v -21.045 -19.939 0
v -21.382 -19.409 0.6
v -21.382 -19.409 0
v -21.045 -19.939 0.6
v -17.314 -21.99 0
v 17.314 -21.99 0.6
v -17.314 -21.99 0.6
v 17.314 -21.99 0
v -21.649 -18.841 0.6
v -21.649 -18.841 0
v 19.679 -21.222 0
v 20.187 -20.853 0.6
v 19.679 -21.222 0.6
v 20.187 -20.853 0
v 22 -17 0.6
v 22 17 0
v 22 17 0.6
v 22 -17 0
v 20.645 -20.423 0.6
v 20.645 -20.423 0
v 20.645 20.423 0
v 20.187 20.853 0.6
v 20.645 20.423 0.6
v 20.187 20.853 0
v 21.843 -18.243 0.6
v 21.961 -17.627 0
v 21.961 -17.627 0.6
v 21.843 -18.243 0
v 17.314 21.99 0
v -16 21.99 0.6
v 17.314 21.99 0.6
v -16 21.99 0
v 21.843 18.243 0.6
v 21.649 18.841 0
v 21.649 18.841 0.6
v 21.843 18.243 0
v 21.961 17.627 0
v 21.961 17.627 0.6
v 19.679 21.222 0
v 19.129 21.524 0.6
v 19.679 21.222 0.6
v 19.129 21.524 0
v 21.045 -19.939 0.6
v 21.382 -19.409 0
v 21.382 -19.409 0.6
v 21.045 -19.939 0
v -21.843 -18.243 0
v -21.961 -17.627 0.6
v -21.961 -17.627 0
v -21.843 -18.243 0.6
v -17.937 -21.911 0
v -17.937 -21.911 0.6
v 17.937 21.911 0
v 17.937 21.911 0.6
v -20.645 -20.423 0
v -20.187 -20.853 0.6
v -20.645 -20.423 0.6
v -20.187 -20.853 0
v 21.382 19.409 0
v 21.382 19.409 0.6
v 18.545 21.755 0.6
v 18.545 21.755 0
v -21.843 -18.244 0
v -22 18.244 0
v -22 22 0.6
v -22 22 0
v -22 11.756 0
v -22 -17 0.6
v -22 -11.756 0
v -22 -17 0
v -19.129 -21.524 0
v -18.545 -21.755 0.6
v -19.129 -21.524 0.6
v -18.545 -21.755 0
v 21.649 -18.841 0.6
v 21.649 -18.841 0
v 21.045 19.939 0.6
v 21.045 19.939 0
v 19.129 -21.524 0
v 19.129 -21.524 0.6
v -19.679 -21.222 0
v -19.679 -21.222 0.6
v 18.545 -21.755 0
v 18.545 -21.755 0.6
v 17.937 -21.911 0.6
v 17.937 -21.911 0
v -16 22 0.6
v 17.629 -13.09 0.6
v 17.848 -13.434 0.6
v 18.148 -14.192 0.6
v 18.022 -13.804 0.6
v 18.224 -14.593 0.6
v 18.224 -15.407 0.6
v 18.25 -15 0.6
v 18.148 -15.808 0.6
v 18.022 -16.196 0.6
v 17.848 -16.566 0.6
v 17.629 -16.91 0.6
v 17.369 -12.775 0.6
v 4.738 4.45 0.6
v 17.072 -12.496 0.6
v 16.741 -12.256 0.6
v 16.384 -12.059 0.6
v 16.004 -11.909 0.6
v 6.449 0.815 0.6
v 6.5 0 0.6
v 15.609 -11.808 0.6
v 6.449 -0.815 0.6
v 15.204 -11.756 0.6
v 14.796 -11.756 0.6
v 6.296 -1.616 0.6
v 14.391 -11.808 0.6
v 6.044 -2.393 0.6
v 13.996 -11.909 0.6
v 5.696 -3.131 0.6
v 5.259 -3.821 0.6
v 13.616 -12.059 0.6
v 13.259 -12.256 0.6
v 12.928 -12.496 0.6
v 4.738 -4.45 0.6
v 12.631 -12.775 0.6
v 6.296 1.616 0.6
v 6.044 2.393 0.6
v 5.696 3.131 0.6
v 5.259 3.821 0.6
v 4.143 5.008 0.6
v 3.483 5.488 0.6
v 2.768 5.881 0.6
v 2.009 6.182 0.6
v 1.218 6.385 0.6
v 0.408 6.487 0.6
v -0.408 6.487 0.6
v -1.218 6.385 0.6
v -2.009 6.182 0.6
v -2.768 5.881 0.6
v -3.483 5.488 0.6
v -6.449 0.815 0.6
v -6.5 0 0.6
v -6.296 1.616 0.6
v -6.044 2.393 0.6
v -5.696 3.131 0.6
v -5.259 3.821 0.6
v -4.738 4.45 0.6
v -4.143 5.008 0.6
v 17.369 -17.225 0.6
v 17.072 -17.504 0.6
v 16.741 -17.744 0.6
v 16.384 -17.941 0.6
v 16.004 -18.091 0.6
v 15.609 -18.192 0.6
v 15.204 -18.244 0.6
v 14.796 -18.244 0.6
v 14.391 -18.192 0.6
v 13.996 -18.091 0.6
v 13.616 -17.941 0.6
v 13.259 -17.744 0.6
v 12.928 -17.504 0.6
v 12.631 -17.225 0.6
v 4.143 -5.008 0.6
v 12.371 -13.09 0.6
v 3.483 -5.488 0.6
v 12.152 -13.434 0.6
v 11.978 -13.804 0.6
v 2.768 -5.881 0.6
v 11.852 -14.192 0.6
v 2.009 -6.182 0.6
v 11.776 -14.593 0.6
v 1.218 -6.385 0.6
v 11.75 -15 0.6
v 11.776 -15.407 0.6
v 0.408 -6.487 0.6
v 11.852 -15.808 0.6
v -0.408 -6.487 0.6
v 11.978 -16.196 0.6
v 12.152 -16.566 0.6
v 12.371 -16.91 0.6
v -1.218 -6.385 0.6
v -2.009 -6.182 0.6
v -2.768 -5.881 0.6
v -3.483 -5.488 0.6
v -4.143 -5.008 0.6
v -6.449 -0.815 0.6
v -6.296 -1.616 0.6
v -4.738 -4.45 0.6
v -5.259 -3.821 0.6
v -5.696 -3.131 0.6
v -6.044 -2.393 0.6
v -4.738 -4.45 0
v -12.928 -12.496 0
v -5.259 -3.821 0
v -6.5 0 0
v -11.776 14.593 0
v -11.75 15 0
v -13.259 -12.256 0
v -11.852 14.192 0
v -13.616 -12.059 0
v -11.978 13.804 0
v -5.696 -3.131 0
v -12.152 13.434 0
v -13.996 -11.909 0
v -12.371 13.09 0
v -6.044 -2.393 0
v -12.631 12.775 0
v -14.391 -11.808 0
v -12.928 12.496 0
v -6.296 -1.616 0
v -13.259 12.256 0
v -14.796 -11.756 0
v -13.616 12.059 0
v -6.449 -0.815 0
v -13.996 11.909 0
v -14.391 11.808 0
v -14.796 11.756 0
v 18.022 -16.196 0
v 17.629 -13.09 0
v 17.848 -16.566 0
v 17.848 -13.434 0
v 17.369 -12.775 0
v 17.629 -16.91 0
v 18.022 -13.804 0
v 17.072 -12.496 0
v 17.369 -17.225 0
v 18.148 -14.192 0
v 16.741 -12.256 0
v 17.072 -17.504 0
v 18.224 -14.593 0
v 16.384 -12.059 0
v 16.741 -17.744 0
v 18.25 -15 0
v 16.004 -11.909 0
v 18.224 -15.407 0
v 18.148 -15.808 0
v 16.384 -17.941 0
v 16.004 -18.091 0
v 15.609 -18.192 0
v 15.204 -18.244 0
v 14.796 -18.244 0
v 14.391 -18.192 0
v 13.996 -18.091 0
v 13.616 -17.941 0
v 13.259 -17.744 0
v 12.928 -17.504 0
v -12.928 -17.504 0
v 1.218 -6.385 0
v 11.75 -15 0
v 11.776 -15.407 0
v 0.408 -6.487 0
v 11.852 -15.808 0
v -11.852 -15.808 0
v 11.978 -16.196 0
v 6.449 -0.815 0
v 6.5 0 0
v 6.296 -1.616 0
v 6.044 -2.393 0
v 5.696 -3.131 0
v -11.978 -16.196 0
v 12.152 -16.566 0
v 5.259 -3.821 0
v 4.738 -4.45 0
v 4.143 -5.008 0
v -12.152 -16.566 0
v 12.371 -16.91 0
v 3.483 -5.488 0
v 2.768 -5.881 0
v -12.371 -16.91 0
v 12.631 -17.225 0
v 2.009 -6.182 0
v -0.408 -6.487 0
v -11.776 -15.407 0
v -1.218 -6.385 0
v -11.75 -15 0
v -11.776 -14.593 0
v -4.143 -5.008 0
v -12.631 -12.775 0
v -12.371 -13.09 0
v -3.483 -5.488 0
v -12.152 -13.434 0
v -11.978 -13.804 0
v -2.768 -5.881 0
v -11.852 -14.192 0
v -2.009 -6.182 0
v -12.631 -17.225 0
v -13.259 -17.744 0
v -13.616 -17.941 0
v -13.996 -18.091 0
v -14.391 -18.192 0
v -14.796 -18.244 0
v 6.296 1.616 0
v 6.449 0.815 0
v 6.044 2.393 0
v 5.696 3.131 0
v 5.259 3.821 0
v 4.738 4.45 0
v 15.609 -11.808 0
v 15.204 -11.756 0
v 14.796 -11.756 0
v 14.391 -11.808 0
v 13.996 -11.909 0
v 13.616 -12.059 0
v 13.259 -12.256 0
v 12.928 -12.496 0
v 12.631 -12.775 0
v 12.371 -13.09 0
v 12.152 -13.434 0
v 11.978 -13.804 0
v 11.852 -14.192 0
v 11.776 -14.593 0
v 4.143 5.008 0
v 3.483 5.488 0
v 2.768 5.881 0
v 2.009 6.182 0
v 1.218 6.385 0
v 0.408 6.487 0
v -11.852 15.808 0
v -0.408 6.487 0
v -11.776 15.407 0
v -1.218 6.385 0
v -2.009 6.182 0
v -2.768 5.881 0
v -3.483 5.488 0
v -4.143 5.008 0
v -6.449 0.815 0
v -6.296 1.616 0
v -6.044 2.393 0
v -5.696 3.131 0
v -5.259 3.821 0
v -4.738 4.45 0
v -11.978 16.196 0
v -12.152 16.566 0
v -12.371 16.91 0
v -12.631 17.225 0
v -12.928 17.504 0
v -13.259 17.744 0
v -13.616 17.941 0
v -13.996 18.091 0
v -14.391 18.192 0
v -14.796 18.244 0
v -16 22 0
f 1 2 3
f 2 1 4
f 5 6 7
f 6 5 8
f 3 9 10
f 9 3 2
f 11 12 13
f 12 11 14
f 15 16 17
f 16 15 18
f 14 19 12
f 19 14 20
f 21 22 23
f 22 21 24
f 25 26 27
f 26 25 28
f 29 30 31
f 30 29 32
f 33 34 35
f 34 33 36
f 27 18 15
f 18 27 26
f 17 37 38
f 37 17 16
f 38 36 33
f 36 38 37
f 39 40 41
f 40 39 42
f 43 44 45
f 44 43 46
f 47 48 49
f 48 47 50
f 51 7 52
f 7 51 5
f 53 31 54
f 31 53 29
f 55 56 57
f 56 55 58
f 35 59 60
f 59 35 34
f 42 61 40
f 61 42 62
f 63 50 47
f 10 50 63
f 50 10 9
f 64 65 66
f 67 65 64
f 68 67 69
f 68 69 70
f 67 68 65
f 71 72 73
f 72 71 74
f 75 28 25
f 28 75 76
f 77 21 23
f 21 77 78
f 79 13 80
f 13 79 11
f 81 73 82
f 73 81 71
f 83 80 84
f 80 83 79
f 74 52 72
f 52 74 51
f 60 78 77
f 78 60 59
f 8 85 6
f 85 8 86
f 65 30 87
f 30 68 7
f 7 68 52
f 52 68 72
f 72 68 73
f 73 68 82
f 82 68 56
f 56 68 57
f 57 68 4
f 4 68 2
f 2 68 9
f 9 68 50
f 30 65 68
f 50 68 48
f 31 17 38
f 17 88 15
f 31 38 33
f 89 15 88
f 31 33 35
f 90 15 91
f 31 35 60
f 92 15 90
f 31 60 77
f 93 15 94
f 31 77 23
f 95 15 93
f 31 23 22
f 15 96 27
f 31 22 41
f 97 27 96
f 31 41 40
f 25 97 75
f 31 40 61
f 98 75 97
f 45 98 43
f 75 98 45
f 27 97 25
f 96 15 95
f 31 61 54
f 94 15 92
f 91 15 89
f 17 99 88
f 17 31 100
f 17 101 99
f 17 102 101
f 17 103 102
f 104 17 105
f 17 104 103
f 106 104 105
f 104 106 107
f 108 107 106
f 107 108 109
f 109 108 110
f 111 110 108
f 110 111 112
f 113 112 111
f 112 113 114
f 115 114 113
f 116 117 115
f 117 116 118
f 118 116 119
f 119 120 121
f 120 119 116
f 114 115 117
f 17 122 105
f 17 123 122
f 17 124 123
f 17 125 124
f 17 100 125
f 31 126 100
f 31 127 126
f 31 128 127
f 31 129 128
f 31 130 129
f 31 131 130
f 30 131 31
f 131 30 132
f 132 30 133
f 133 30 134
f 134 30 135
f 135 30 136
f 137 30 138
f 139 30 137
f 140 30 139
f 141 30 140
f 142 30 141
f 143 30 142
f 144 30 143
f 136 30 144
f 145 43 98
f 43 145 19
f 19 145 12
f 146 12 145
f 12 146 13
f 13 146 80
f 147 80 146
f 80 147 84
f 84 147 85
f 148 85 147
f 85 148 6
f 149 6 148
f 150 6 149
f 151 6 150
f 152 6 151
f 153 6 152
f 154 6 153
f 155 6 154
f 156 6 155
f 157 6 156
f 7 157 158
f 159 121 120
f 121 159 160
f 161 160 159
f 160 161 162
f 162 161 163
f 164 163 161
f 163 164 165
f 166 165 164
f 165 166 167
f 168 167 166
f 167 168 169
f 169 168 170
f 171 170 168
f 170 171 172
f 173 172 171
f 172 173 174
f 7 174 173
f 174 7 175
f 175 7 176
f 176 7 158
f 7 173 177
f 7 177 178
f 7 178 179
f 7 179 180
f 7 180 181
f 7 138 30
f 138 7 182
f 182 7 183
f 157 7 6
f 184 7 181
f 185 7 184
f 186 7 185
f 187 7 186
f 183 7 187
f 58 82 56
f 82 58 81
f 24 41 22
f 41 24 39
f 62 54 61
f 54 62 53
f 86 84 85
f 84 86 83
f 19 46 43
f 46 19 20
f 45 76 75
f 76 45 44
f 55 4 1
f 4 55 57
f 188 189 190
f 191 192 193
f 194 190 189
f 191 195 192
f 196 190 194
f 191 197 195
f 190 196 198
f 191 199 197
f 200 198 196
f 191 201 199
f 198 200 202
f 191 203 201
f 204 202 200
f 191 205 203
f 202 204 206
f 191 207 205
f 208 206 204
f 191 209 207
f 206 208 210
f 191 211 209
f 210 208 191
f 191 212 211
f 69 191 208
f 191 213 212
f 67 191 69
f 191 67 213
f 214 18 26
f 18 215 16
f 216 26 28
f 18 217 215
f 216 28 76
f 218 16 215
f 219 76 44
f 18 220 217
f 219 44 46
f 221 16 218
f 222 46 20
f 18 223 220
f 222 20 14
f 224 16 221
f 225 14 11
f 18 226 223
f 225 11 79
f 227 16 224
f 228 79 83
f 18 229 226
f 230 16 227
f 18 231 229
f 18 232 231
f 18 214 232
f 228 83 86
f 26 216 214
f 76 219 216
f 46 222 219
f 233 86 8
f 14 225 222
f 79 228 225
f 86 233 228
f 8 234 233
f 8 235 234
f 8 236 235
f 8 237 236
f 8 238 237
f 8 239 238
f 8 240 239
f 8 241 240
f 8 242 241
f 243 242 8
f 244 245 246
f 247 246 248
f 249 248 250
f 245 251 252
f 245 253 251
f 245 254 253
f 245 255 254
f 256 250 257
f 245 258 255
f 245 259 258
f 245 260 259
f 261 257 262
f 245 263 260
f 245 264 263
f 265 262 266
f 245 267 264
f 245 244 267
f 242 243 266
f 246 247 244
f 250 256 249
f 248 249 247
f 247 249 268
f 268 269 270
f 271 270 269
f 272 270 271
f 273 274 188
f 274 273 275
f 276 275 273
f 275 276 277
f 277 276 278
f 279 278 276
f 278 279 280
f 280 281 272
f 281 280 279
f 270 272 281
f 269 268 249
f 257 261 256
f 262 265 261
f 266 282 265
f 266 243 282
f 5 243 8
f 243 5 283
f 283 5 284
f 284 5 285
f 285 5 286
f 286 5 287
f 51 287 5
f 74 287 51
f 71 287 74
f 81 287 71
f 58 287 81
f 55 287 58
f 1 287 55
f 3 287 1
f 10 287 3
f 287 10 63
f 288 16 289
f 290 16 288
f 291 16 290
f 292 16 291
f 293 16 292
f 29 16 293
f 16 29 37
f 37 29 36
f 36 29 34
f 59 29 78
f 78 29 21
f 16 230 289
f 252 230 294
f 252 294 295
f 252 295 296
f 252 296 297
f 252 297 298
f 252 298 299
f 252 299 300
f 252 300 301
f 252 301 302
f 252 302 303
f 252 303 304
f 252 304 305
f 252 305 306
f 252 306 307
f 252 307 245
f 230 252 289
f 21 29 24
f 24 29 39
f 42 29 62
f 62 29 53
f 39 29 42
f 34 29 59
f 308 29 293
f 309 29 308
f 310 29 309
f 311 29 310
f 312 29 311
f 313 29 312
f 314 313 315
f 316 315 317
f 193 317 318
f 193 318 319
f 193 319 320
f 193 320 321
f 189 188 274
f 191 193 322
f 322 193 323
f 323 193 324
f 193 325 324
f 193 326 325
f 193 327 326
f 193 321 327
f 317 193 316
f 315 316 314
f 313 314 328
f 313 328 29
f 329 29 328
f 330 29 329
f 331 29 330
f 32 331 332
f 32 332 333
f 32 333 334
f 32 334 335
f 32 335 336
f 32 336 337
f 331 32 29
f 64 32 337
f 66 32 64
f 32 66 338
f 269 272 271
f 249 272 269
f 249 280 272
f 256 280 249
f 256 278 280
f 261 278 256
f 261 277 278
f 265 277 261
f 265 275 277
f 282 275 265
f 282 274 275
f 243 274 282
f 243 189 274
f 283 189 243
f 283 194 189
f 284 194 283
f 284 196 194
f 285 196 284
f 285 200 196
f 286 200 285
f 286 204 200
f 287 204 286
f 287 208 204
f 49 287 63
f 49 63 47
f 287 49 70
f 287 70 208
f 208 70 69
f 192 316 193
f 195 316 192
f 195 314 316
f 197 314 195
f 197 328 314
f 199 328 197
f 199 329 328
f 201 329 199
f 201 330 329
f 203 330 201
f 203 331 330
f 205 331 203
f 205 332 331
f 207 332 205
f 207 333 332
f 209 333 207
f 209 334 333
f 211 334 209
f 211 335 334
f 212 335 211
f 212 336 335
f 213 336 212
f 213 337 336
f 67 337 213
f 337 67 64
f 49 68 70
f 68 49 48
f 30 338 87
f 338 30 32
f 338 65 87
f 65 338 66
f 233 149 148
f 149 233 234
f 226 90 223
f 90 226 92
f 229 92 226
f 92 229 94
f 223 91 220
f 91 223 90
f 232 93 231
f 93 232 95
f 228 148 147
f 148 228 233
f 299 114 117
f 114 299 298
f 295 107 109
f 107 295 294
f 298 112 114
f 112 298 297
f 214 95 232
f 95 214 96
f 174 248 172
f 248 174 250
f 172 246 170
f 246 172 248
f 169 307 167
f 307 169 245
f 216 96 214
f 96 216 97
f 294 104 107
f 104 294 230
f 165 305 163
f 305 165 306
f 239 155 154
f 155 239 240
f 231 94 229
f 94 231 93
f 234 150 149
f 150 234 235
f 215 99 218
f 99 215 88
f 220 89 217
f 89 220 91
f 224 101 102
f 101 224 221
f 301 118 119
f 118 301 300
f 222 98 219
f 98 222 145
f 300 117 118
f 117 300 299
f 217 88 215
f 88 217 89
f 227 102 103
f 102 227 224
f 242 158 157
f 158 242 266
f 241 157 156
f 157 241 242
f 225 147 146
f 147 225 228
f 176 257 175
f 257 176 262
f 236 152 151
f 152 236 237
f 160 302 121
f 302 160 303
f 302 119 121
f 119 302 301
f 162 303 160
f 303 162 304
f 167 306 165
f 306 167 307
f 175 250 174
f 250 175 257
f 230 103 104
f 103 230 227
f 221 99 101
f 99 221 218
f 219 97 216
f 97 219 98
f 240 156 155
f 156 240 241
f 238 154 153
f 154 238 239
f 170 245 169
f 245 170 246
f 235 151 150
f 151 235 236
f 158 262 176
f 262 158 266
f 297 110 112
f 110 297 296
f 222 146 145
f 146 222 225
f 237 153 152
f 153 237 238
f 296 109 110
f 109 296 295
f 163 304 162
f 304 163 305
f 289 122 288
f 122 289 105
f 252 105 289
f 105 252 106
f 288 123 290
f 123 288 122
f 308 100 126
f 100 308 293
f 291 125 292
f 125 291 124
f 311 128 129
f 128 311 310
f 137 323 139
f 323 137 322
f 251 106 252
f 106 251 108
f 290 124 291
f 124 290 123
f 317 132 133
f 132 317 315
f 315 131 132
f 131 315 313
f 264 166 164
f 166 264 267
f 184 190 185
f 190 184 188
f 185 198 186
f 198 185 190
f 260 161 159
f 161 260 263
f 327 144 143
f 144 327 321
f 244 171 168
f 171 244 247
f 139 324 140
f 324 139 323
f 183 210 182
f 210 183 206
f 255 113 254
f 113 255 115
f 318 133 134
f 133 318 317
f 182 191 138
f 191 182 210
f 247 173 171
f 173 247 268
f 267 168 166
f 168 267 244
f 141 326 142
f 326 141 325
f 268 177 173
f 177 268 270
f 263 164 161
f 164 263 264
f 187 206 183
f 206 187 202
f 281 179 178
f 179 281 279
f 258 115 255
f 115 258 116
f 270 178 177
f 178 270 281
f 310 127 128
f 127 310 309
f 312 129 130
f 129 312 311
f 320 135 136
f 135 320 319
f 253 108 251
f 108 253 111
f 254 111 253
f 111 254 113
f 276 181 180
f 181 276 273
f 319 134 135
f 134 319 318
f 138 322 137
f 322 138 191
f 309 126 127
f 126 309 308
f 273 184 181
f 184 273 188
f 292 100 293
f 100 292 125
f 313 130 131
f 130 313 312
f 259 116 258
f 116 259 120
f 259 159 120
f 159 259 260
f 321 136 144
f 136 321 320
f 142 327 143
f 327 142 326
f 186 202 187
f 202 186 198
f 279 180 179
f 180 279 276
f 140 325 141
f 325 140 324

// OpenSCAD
$fn = 50;


difference() {
	union() {
		hull() {
			translate(v = [-17.0000000000, 17.0000000000, 0]) {
				cylinder(h = 0.6000000000, r = 5);
			}
			translate(v = [17.0000000000, 17.0000000000, 0]) {
				cylinder(h = 0.6000000000, r = 5);
			}
			translate(v = [-17.0000000000, -17.0000000000, 0]) {
				cylinder(h = 0.6000000000, r = 5);
			}
			translate(v = [17.0000000000, -17.0000000000, 0]) {
				cylinder(h = 0.6000000000, r = 5);
			}
		}
		translate(v = [-22.0000000000, 16.0000000000, 0]) {
			cube(size = [6, 6, 0.6000000000]);
		}
	}
	union() {
		translate(v = [-22.5000000000, -15.0000000000, -250.0000000000]) {
			rotate(a = [0, 0, 0]) {
				difference() {
					union() {
						hull() {
							translate(v = [7.5000000000, 0, 0]) {
								cylinder(h = 250, r = 3.2500000000, r1 = 3.2500000000, r2 = 3.2500000000);
							}
							translate(v = [-7.5000000000, 0, 0]) {
								cylinder(h = 250, r = 3.2500000000, r1 = 3.2500000000, r2 = 3.2500000000);
							}
						}
					}
					union();
				}
			}
		}
		translate(v = [-22.5000000000, 15.0000000000, -250.0000000000]) {
			rotate(a = [0, 0, 0]) {
				difference() {
					union() {
						hull() {
							translate(v = [7.5000000000, 0, 0]) {
								cylinder(h = 250, r = 3.2500000000, r1 = 3.2500000000, r2 = 3.2500000000);
							}
							translate(v = [-7.5000000000, 0, 0]) {
								cylinder(h = 250, r = 3.2500000000, r1 = 3.2500000000, r2 = 3.2500000000);
							}
						}
					}
					union();
				}
			}
		}
		translate(v = [15.0000000000, -15.0000000000, 0]) {
			cylinder(h = 100, r = 3.2500000000);
		}
		cylinder(h = 0.6000000000, r = 6.5000000000);
	}
}
